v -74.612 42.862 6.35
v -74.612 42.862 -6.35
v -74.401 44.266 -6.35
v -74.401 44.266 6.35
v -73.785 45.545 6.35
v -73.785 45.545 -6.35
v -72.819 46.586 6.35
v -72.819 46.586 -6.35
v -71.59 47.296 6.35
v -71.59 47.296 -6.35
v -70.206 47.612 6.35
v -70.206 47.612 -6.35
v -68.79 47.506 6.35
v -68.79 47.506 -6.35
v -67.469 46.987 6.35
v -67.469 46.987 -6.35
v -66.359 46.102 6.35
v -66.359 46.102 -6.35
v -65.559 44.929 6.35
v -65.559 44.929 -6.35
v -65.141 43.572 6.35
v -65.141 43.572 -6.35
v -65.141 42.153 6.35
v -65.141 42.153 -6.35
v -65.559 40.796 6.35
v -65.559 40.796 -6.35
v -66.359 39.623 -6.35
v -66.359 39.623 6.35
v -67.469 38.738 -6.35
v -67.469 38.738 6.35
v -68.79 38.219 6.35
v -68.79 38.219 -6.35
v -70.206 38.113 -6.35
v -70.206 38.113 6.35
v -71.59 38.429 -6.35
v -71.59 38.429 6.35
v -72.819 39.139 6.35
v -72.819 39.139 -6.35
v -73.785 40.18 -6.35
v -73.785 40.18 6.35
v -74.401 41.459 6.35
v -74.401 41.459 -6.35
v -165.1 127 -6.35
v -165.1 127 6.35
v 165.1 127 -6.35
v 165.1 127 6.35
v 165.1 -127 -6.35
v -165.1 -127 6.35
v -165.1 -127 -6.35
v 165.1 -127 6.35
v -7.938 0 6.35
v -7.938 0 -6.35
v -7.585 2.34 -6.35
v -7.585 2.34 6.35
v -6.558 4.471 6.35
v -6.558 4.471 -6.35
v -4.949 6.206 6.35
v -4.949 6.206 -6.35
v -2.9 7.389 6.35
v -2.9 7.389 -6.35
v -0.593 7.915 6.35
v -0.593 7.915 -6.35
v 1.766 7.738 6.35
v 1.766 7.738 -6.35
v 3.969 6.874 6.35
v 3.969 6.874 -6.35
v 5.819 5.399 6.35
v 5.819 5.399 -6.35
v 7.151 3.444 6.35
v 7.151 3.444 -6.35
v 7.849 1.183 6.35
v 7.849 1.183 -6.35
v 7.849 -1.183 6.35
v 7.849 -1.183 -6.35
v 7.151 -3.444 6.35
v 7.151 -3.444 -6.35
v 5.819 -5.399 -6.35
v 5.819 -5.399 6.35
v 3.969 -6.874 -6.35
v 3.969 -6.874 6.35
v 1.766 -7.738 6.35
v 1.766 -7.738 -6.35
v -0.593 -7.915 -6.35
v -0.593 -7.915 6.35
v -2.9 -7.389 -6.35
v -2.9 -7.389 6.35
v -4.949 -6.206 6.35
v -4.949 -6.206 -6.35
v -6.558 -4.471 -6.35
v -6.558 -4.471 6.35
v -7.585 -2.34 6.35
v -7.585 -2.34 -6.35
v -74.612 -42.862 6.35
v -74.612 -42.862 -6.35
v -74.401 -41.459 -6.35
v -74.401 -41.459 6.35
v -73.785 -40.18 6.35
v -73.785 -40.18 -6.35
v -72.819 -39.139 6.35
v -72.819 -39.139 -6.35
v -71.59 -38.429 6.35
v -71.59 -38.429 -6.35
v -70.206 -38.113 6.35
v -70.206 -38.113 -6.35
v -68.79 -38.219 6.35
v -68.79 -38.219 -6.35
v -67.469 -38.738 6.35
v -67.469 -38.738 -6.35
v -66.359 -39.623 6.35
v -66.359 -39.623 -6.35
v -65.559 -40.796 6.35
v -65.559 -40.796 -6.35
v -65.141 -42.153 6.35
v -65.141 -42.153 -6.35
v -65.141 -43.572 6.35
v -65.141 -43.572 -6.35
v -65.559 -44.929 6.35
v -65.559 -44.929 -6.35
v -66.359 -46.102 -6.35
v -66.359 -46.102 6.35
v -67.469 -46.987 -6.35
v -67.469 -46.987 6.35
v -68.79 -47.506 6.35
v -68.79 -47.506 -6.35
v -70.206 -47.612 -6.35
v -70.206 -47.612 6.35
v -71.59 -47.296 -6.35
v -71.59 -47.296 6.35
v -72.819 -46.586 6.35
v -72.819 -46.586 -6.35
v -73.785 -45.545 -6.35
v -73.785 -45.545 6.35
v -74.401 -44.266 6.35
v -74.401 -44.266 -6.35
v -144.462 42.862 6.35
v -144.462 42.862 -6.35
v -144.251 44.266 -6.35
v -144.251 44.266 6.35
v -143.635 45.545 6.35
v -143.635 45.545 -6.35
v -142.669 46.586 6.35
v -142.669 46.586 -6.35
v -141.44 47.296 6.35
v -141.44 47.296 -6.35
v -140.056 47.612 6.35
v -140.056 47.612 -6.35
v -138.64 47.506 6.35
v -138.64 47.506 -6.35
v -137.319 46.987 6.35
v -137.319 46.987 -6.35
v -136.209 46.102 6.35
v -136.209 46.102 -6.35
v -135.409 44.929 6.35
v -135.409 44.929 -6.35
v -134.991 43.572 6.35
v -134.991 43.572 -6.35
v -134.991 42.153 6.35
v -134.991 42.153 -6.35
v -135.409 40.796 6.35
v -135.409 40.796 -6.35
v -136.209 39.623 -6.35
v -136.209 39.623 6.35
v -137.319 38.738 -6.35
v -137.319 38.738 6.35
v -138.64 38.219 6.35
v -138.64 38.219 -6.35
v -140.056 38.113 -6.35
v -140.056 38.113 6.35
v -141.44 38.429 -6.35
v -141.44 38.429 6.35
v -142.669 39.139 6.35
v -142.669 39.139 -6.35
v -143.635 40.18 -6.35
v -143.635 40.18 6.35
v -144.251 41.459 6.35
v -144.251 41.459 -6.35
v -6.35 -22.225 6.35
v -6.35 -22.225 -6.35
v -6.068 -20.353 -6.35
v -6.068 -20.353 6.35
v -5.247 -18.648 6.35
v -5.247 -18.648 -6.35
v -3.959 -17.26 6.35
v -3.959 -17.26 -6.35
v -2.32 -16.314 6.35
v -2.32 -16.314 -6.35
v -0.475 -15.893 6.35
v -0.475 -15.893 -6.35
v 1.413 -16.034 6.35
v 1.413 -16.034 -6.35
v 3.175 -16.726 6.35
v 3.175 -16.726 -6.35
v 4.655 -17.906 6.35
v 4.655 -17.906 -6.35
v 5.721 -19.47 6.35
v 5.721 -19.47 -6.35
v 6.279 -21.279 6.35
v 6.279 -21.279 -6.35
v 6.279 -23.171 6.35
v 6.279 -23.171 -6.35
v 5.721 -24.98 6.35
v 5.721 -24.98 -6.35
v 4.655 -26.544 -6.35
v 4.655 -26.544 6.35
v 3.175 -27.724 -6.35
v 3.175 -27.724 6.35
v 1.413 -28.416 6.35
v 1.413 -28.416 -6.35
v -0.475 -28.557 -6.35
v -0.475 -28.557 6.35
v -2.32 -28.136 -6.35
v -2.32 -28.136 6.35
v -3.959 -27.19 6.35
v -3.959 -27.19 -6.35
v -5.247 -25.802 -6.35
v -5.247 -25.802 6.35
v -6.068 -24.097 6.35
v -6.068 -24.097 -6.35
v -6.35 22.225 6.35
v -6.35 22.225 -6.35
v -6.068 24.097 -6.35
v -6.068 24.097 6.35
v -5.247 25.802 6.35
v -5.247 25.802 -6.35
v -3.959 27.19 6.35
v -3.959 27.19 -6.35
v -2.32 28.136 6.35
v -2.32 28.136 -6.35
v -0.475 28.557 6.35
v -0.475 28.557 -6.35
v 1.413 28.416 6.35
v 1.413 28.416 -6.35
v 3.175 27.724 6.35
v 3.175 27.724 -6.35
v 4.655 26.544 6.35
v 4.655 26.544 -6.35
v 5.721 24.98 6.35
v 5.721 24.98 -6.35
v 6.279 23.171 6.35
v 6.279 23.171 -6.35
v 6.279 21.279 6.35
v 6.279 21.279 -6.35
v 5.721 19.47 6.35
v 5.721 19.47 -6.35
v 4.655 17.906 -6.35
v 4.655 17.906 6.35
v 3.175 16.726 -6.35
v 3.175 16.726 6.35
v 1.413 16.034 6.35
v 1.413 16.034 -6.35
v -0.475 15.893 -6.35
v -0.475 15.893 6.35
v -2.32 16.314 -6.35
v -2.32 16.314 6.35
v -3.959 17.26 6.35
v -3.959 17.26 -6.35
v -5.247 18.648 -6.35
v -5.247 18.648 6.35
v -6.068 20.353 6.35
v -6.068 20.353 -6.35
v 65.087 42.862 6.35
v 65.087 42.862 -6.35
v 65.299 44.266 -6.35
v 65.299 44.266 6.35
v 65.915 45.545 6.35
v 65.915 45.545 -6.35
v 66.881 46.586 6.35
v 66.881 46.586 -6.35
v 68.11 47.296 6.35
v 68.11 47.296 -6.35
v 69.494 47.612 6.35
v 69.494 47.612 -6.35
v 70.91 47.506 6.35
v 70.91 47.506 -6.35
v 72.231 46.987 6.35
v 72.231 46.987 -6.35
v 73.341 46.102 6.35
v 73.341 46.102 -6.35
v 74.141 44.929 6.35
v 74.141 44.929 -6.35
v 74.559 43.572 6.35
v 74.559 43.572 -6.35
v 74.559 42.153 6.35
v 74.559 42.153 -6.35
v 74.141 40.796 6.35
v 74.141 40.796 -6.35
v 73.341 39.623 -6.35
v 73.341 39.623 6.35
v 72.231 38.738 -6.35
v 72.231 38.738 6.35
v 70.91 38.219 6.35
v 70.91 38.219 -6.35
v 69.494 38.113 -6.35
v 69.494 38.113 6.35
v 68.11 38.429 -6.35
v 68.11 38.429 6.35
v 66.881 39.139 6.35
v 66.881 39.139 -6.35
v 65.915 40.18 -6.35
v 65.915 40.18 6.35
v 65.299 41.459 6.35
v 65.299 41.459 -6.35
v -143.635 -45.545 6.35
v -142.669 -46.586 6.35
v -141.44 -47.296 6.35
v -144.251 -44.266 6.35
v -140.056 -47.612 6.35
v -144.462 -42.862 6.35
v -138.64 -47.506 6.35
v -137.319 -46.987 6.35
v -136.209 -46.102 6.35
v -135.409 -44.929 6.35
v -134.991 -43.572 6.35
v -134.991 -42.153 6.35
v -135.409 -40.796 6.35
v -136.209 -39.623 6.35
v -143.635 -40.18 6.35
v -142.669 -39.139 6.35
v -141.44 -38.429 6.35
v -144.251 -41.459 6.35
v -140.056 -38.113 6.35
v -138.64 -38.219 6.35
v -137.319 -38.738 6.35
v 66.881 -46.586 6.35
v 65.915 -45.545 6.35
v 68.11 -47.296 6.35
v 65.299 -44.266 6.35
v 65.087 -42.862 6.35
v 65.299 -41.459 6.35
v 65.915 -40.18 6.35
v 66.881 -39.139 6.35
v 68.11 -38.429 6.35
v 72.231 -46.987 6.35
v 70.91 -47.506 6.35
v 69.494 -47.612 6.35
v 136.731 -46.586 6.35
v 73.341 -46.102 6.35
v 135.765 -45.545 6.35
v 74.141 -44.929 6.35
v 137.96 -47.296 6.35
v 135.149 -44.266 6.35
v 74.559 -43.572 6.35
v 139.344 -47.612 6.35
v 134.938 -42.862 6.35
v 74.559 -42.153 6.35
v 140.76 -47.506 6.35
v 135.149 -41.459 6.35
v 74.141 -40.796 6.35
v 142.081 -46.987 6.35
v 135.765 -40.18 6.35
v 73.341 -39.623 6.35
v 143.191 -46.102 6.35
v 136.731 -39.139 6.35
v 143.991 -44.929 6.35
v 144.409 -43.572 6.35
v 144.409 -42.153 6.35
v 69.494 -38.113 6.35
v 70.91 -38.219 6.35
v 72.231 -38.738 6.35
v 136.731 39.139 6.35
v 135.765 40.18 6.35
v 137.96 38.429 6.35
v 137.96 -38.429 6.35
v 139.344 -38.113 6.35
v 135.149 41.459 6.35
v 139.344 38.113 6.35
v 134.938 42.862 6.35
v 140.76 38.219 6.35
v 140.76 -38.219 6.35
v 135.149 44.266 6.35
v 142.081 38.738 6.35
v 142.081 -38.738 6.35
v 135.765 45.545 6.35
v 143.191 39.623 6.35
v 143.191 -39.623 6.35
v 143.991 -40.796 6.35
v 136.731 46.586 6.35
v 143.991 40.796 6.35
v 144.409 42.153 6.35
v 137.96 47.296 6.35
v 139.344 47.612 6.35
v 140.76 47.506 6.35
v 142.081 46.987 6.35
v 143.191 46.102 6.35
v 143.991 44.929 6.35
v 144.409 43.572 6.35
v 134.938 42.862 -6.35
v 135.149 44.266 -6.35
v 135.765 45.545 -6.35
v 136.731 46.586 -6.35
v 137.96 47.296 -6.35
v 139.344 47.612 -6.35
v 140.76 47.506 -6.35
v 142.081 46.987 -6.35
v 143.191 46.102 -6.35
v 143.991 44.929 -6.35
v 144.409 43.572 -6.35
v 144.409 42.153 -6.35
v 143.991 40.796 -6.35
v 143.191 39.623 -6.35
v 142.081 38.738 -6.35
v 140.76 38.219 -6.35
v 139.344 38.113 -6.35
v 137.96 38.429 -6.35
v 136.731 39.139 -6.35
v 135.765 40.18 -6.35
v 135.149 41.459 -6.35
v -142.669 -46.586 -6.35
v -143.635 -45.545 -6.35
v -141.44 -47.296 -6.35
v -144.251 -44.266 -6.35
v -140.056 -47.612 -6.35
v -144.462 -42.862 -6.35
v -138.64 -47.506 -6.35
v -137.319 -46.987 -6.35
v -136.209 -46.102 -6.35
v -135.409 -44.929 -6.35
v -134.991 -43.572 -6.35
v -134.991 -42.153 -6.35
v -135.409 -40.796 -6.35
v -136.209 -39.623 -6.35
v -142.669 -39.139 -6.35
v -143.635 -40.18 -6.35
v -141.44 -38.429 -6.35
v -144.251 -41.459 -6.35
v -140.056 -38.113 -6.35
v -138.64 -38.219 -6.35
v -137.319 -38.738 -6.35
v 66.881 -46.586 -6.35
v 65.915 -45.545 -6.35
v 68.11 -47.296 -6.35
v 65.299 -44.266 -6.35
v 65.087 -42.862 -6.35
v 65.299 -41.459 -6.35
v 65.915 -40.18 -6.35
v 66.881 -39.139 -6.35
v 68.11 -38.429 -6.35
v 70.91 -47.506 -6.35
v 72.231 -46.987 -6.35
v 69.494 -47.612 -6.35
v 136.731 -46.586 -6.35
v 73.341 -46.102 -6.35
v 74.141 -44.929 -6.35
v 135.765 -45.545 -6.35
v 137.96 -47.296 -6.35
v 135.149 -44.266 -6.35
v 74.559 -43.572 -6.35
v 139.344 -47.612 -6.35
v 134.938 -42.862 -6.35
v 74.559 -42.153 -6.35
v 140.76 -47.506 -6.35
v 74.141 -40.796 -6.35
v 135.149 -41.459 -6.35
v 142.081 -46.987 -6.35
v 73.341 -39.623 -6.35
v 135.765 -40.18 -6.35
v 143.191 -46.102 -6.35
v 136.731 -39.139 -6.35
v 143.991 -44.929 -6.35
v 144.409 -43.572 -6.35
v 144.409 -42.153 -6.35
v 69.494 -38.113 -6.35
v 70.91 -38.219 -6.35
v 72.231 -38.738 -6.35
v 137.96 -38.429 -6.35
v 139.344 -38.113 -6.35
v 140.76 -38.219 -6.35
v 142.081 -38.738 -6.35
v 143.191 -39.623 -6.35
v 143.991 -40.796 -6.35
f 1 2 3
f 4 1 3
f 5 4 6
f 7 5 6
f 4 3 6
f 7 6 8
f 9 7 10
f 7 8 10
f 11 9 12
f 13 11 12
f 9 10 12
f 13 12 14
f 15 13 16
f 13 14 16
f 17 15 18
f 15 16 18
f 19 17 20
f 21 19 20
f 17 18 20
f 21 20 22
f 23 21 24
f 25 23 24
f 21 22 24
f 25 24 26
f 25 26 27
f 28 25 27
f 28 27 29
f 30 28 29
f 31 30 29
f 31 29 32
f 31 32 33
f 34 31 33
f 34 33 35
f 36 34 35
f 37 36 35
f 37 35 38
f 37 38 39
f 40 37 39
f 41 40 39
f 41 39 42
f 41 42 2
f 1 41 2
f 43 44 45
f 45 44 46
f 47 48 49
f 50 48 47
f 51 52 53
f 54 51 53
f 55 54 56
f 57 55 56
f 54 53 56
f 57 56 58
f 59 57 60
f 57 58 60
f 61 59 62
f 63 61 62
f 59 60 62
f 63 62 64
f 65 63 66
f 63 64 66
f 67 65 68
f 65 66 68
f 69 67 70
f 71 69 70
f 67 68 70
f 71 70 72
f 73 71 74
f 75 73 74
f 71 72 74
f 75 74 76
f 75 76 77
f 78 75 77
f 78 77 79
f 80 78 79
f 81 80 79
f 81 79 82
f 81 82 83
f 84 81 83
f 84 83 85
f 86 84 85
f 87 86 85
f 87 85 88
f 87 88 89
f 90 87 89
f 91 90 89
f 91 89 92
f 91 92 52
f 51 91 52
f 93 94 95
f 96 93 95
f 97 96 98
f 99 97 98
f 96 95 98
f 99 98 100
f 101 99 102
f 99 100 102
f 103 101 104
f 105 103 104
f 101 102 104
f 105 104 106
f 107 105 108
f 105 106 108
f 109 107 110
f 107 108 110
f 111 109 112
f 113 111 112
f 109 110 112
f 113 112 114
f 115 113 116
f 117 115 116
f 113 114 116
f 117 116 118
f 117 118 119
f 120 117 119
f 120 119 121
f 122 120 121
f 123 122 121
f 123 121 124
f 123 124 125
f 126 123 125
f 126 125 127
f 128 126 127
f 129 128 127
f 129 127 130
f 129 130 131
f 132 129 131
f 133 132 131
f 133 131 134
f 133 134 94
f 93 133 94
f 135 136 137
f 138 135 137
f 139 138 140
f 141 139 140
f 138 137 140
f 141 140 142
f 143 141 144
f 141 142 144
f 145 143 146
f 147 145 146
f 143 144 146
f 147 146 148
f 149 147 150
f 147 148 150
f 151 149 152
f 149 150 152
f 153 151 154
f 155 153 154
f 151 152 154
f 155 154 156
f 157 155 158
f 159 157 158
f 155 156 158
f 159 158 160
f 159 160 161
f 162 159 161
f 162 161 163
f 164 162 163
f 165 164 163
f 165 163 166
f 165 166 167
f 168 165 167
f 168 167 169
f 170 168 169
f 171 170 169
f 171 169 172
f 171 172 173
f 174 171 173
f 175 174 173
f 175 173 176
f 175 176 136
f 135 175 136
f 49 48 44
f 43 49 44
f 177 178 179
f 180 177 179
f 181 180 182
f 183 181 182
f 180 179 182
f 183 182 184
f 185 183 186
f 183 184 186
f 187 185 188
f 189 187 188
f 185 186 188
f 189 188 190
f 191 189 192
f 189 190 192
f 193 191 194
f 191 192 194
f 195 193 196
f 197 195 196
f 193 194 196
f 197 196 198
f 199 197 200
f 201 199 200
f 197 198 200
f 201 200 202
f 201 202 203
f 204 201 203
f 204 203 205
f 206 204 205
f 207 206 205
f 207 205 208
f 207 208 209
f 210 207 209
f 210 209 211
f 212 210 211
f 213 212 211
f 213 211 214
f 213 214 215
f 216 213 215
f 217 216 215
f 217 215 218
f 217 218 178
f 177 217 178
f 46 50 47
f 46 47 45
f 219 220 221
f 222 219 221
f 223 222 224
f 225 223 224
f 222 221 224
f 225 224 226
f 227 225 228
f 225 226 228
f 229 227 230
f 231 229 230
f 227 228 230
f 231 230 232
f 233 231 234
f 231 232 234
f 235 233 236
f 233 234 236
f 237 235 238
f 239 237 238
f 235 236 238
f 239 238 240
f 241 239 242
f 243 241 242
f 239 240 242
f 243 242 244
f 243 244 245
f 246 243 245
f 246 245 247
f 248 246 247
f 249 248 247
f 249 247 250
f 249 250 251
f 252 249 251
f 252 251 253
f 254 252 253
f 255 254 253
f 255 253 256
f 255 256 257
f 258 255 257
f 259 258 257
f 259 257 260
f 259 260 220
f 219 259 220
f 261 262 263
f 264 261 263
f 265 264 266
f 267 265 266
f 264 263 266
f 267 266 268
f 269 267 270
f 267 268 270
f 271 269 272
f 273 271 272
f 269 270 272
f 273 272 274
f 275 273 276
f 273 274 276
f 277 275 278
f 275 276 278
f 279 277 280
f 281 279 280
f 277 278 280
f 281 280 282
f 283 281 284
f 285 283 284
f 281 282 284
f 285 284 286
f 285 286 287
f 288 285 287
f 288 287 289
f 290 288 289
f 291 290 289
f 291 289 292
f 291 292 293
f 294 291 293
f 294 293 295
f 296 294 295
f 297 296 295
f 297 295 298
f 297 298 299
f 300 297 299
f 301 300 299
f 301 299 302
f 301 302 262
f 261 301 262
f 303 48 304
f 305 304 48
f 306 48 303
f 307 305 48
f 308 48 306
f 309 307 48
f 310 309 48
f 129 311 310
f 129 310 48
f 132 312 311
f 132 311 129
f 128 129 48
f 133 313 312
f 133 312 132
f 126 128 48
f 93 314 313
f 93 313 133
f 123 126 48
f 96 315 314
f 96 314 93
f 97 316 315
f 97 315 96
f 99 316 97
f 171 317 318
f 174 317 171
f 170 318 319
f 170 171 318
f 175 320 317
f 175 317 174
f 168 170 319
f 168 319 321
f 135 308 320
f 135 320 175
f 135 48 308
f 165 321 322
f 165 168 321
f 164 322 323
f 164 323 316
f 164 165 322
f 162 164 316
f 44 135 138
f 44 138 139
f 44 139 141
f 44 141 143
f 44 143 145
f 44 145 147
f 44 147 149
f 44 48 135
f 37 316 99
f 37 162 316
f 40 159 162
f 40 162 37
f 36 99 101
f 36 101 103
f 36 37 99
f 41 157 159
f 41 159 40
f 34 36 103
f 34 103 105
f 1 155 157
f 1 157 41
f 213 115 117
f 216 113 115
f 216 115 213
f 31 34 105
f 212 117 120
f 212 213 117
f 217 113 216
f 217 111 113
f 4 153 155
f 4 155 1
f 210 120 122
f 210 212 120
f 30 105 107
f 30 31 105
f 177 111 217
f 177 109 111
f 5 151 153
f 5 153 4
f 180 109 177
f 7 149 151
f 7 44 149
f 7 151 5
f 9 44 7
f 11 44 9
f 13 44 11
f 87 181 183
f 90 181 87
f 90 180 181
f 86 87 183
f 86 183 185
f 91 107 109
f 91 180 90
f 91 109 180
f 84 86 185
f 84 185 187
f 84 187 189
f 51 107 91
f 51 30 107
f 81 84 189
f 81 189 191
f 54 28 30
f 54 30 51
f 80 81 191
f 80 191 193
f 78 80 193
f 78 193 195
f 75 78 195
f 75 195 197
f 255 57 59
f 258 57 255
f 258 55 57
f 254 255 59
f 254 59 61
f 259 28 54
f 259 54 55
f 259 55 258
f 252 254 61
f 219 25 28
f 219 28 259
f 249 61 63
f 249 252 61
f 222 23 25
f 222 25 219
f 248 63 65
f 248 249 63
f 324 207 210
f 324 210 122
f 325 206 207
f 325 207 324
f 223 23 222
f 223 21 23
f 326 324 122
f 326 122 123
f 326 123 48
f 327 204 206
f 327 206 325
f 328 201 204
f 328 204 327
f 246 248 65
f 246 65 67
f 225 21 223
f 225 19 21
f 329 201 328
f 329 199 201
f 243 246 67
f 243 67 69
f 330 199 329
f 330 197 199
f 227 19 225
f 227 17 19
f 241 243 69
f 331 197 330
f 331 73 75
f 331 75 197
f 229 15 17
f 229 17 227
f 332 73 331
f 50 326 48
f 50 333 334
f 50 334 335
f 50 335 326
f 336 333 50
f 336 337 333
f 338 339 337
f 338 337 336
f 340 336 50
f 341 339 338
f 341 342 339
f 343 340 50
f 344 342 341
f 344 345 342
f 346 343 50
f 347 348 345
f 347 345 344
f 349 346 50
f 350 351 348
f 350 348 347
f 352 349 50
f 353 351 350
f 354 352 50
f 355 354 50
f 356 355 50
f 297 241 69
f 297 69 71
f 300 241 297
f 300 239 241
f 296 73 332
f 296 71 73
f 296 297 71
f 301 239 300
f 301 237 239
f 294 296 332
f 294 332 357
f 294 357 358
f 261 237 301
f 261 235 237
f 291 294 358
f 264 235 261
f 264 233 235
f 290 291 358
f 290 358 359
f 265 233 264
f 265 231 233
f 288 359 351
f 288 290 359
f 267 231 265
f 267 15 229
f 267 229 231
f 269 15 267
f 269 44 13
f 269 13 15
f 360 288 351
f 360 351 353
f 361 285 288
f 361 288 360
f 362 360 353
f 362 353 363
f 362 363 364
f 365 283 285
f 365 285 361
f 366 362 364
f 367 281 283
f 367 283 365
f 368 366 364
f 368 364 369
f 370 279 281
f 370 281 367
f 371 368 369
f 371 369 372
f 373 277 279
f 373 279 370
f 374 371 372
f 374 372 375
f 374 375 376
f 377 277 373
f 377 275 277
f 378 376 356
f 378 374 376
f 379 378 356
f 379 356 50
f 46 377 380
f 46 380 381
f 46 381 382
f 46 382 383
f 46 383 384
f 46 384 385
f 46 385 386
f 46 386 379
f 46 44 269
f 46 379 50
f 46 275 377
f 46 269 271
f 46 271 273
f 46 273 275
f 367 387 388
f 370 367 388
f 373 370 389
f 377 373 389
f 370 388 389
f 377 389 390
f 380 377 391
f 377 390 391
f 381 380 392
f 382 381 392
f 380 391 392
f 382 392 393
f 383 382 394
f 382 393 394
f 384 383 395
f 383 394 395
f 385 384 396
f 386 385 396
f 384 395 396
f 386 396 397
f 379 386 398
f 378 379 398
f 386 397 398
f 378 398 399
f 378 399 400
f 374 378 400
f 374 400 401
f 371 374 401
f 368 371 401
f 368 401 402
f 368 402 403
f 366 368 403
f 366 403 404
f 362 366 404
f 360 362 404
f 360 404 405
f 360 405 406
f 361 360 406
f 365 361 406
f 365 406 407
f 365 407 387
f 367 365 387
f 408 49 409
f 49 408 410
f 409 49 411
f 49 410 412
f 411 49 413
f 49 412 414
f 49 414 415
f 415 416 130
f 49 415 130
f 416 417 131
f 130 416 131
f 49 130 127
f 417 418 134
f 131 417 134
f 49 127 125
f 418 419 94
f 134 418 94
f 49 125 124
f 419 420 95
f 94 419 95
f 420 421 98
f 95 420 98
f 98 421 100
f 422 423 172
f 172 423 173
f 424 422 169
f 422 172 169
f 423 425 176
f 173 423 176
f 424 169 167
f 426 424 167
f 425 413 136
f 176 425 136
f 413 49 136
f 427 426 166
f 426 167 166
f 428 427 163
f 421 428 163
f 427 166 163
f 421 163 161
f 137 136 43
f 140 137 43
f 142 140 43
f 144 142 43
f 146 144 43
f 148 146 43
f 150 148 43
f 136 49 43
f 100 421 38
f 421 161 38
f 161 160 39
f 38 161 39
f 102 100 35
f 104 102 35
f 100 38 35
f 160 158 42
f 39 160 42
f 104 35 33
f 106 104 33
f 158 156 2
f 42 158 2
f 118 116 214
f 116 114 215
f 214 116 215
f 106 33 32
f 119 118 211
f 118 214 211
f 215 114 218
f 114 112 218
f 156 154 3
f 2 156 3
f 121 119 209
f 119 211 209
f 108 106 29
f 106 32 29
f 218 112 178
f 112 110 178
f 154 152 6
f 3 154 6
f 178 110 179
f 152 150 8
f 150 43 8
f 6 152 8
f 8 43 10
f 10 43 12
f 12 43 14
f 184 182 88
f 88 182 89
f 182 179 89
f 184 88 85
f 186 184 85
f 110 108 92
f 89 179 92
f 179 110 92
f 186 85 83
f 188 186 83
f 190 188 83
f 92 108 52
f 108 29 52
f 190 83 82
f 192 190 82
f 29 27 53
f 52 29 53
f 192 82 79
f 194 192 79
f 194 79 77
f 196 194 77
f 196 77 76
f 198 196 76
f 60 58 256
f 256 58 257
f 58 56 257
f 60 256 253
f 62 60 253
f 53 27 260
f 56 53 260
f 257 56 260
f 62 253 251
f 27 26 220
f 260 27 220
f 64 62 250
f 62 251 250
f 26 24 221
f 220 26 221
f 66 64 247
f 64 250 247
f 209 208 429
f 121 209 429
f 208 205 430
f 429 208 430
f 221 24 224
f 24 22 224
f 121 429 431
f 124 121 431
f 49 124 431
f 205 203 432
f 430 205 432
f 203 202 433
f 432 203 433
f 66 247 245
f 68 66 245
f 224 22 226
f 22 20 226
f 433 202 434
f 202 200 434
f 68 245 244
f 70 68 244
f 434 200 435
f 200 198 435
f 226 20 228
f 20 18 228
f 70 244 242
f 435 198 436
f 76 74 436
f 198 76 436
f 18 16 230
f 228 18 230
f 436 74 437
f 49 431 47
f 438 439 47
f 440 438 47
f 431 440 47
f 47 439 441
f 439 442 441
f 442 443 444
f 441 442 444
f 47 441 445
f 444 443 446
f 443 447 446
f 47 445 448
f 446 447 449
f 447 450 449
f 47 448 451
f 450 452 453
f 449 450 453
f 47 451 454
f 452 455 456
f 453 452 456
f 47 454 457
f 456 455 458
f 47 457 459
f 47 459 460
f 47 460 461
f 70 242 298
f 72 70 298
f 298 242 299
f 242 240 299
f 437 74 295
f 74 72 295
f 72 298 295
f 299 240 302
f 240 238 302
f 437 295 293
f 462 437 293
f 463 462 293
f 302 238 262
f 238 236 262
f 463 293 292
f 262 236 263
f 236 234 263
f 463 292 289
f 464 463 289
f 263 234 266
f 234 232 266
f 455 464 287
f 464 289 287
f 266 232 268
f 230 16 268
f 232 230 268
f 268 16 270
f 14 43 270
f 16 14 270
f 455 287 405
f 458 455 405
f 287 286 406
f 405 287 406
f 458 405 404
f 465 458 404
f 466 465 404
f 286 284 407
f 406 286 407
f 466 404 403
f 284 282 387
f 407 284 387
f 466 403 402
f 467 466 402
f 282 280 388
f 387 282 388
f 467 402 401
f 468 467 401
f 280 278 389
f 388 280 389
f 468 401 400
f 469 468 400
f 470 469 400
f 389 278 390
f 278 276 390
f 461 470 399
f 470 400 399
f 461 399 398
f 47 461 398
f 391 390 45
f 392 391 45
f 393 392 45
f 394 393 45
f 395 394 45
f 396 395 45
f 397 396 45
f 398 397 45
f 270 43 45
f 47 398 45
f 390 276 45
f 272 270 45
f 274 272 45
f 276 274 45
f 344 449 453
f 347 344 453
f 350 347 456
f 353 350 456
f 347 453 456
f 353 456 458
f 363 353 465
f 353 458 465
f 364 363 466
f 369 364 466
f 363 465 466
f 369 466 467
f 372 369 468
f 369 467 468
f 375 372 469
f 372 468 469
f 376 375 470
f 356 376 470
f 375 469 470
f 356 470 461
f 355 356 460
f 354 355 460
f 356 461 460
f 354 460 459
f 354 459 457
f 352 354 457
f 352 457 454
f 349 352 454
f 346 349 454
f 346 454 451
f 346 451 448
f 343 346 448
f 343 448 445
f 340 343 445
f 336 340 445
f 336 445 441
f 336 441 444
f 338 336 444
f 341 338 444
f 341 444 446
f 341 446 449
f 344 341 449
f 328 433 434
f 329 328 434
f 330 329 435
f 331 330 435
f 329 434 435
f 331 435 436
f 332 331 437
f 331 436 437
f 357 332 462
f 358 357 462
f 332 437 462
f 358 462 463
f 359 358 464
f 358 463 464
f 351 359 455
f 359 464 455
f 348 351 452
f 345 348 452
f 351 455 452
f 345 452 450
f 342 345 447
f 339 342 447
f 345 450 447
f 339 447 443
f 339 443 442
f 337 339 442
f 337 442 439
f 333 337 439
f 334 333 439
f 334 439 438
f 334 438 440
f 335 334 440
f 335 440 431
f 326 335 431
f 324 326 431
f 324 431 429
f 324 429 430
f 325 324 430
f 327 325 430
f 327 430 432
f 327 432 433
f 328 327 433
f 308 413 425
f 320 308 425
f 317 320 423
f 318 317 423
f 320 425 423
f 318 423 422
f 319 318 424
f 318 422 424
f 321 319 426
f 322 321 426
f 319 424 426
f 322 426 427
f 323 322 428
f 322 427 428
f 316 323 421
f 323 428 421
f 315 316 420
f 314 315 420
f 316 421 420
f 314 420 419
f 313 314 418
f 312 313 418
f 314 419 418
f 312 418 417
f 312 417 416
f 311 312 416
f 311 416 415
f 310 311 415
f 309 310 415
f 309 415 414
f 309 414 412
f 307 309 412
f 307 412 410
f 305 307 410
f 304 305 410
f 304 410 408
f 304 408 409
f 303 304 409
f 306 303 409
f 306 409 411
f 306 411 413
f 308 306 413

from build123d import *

# Parameters (mm, degrees)
F0_W     = 330.2
F0_H     = 254
F1_DEPTH = 6.35
F3_D     = 12.7
F5_D     = 15.875
F7_D     = 9.525


with BuildPart() as f1:
    # F0 (on Top) → F1 (new body, symmetric)
    with BuildSketch(Plane.XY):
        Rectangle(F0_W, F0_H)
    extrude(amount=F1_DEPTH, both=True)

    # F3 (through all)
    with Locations(Plane.XY.offset(6.35)):
        with Locations((0, 22.225), (0, -22.225)):
            Hole(F3_D / 2)

    # F5 (through all)
    with Locations(Plane.XY.offset(6.35)):
        with Locations((0, 0)):
            Hole(F5_D / 2)

    # F7 (through all)
    with Locations(Plane.XY.offset(6.35)):
        with Locations((-69.85, 42.8625), (-139.7, 42.8625), (-139.7, -42.8625), (-69.85, -42.8625), (69.85, 42.8625), (139.7, 42.8625), (139.7, -42.8625), (69.85, -42.8625)):
            Hole(F7_D / 2)


solid = f1.part
